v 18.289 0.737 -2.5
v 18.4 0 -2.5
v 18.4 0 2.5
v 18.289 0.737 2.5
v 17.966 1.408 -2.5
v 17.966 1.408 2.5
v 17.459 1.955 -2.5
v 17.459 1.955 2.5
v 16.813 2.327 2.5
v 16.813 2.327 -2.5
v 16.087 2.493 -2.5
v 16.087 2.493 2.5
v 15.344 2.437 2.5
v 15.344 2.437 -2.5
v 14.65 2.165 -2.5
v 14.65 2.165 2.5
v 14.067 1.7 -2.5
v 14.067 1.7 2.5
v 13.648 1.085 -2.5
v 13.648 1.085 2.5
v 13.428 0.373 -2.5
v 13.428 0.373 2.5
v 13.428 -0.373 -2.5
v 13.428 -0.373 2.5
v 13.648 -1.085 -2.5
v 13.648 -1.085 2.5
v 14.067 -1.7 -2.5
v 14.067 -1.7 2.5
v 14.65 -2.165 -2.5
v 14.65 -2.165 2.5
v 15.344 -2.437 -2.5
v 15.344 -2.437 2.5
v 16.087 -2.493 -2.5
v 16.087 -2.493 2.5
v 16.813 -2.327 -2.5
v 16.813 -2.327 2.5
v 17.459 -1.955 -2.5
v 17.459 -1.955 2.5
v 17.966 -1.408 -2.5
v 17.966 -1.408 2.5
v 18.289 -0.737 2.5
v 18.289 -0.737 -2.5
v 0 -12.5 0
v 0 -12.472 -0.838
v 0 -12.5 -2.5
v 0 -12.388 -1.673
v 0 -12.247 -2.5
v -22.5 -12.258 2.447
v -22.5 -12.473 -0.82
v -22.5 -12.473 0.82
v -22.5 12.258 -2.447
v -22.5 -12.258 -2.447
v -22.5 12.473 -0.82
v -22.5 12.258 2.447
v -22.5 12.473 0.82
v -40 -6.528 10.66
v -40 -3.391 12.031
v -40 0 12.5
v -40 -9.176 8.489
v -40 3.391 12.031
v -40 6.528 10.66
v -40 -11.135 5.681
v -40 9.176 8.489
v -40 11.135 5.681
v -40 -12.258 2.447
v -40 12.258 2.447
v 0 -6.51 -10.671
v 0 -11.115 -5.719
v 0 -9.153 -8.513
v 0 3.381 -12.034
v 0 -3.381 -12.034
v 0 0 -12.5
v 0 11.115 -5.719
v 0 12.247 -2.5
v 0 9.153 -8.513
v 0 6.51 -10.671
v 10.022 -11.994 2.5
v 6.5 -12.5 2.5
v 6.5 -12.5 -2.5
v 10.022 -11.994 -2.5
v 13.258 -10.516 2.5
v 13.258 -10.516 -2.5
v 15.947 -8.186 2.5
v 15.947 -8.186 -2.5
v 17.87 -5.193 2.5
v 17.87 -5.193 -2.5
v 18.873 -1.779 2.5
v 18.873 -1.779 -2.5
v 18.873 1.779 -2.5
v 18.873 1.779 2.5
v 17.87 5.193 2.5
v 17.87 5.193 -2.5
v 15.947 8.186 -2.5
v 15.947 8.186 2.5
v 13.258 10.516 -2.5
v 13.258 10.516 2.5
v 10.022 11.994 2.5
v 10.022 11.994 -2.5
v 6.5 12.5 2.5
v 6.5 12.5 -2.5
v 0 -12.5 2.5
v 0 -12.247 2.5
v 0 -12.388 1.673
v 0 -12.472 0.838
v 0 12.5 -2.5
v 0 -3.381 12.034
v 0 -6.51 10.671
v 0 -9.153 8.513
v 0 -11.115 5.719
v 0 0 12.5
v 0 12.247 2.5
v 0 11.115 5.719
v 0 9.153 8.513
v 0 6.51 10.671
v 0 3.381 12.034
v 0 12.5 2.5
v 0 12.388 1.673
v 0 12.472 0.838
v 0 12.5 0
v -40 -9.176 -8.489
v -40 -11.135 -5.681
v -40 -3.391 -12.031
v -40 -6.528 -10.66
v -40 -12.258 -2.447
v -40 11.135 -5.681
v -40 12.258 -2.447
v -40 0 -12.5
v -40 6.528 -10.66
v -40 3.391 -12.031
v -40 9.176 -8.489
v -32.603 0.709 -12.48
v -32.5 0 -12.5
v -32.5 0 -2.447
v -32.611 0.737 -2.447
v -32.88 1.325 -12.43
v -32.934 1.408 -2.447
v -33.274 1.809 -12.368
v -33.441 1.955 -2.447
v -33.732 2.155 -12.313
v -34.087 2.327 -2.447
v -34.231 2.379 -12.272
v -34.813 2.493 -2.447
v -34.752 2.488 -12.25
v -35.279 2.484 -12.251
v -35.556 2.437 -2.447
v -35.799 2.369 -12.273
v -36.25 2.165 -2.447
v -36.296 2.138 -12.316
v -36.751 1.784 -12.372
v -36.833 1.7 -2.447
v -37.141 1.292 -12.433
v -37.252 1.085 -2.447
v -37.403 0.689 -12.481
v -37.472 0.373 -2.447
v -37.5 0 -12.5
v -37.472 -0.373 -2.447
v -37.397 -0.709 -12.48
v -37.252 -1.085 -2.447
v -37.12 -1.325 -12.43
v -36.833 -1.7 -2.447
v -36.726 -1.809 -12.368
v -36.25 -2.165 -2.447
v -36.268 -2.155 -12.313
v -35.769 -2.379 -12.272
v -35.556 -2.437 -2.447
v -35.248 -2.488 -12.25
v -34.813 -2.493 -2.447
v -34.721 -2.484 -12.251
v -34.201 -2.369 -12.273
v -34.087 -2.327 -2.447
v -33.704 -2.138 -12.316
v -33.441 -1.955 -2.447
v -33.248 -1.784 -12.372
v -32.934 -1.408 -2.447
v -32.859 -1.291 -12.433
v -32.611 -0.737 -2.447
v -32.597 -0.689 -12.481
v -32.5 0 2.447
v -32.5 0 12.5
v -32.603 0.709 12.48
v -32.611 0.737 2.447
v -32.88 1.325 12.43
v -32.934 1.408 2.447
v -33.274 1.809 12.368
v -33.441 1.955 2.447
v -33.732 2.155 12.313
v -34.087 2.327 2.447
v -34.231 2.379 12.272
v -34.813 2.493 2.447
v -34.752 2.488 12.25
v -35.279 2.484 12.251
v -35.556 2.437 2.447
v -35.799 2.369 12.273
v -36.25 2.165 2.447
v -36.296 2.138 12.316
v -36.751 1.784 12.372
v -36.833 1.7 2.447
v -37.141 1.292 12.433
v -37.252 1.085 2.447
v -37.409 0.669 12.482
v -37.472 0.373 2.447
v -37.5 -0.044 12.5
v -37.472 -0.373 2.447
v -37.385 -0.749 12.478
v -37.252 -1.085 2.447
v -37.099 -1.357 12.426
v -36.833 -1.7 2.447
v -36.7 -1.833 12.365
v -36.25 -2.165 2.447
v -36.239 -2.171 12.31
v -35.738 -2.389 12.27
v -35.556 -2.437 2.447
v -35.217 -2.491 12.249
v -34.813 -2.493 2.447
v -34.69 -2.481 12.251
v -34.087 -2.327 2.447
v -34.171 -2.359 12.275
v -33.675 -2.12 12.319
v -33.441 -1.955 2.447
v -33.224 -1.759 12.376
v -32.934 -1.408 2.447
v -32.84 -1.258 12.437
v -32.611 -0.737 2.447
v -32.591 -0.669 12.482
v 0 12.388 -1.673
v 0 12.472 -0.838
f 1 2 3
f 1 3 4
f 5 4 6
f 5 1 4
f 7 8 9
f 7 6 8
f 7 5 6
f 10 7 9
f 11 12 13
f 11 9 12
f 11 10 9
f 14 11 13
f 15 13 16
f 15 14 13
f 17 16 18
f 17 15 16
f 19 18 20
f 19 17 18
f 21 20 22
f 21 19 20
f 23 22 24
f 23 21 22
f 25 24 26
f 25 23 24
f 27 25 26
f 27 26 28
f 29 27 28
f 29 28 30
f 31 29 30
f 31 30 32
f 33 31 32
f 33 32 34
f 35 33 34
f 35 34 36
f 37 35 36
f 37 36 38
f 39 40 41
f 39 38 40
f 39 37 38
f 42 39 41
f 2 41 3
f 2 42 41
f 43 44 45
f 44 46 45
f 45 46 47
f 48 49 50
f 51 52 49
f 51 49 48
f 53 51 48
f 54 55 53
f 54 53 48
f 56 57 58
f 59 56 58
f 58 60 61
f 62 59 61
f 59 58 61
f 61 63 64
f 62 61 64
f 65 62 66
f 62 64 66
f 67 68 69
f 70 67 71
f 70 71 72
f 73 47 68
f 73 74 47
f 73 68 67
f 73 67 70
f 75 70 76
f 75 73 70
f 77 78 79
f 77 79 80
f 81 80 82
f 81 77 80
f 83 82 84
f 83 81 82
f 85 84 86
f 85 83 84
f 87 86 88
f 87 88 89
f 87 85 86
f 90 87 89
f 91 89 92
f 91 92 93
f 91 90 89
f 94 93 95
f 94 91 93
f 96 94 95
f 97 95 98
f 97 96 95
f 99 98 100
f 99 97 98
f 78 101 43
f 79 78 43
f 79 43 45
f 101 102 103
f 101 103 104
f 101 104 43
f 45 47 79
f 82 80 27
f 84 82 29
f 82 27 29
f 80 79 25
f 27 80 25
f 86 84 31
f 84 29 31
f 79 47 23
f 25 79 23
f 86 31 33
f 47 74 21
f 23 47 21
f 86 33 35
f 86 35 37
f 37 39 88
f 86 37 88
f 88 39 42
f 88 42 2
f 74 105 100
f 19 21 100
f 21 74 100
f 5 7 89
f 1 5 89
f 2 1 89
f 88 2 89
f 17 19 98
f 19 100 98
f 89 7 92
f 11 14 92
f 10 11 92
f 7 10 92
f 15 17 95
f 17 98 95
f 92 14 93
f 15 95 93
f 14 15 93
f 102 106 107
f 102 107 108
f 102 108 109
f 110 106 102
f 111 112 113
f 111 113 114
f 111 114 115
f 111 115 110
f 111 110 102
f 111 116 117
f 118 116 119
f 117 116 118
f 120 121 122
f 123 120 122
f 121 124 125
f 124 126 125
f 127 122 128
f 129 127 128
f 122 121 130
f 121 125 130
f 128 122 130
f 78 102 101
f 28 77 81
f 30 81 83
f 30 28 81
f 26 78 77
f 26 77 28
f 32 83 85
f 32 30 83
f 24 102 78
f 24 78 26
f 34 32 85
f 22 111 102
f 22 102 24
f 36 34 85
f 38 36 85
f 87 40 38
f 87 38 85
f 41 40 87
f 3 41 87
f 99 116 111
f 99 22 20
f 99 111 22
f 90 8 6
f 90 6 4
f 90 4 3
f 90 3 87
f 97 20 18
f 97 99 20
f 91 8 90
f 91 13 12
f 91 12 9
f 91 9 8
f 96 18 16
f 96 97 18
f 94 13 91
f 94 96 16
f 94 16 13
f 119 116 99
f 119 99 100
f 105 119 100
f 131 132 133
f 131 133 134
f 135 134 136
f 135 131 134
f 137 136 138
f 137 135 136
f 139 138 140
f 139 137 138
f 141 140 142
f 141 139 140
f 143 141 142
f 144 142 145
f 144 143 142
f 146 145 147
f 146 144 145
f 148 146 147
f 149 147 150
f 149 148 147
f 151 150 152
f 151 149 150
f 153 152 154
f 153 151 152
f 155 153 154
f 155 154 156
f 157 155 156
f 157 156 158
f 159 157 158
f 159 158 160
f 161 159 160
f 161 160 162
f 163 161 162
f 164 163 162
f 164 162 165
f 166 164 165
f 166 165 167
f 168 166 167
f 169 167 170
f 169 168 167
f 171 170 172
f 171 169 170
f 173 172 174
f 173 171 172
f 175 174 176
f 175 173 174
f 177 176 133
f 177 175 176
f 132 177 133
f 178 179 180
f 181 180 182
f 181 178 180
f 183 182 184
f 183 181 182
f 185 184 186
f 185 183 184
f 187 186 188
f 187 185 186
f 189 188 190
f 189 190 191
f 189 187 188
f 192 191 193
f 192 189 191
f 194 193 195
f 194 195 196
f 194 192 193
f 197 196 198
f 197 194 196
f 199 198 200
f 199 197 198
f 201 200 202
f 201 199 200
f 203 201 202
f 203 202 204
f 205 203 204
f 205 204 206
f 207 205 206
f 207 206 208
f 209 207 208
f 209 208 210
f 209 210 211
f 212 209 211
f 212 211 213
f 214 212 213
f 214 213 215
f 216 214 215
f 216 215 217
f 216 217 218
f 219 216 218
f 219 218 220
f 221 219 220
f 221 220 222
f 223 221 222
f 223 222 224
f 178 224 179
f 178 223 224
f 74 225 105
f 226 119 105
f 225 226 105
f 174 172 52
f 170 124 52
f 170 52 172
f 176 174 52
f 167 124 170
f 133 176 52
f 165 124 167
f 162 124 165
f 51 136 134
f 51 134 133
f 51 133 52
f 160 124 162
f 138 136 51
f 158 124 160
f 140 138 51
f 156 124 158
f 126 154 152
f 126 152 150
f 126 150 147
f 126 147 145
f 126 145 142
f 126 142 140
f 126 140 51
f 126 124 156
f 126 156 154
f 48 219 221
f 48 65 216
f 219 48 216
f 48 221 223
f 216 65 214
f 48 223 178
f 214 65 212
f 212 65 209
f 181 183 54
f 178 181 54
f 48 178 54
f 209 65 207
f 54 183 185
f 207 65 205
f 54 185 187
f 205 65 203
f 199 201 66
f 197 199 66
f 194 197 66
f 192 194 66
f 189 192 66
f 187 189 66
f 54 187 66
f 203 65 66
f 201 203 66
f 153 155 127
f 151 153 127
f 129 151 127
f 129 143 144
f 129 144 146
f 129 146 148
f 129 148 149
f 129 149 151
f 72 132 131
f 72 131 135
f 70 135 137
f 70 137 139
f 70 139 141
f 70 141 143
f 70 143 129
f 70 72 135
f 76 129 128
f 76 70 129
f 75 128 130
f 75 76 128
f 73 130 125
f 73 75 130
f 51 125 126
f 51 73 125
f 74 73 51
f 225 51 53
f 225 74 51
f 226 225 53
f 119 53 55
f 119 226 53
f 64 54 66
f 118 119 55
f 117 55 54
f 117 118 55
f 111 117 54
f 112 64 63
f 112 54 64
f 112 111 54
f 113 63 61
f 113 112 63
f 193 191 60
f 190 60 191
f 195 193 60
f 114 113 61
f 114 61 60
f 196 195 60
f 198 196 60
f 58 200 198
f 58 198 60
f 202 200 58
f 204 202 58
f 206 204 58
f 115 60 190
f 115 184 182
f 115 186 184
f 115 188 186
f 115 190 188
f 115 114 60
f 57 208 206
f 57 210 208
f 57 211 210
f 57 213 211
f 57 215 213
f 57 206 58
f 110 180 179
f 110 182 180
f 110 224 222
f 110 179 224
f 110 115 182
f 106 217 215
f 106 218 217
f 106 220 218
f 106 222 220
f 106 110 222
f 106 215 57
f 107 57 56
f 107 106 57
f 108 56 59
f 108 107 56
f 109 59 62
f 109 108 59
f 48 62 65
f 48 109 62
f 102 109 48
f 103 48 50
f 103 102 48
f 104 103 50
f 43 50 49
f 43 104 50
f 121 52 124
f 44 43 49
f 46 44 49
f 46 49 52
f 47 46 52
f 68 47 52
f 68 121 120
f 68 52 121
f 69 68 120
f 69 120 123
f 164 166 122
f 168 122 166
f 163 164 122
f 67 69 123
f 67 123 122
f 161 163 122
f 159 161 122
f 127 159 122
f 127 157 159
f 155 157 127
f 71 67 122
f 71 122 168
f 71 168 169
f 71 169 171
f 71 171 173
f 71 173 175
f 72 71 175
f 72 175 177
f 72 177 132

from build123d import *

# Parameters (mm, degrees)
SKETCH1_R               = 12.5
BOSS_EXTRUDE1_DEPTH     = 40
SKETCH6_W               = 5
SKETCH6_H               = 25
BOSS_EXTRUDE3_DEPTH     = 6.5
BOSS_EXTRUDE4_DEPTH     = 5
CUT_EXTRUDE1_DEPTH      = 45.511234537
CUT_EXTRUDE1_DEPTH_BACK = 45.511234537
SKETCH10_R              = 2.5
SKETCH12_W              = 4.8936145
SKETCH12_H              = 25
CUT_EXTRUDE2_DEPTH      = 17.5
CUT_EXTRUDE3_DEPTH      = 44.732139211
CUT_EXTRUDE3_DEPTH_BACK = 44.732139211
SKETCH13_R              = 2.5


with BuildPart() as part:
    # Sketch1 → Boss-Extrude1 (new body)
    with BuildSketch(Plane(origin=(0, 0, 0), x_dir=(0, 0, -1), z_dir=(1, 0, 0))):
        Circle(SKETCH1_R)
    extrude(amount=-BOSS_EXTRUDE1_DEPTH)

    # Sketch6 → Boss-Extrude3 (add)
    with BuildSketch(Plane(origin=(0, 0, 0), x_dir=(0, 0, -1), z_dir=(1, 0, 0))):
        Rectangle(SKETCH6_W, SKETCH6_H)
    extrude(amount=BOSS_EXTRUDE3_DEPTH)

    # Sketch8 → Boss-Extrude4 (add)
    with BuildSketch(Plane.XY.offset(2.5)):
        with BuildLine():
            Line((6.5, 12.5), (6.5, -12.5))
            ThreePointArc((6.5, -12.5), (19, 0), (6.5, 12.5))
        make_face()
    extrude(amount=-BOSS_EXTRUDE4_DEPTH)

    # Sketch10 → Cut-Extrude1 (cut, two sides: drawn at the far end of the back side and taken through both)
    with BuildSketch(Plane.XY.offset(2.5).offset(-CUT_EXTRUDE1_DEPTH_BACK)):
        with Locations((15.9, 0)):
            Circle(SKETCH10_R)
    extrude(amount=CUT_EXTRUDE1_DEPTH + CUT_EXTRUDE1_DEPTH_BACK, mode=Mode.SUBTRACT)

    # Sketch12 → Cut-Extrude2 (cut)
    with BuildSketch(Plane.ZY.offset(40)):
        Rectangle(SKETCH12_W, SKETCH12_H)
    extrude(amount=-CUT_EXTRUDE2_DEPTH, mode=Mode.SUBTRACT)

    # Sketch13 → Cut-Extrude3 (cut, two sides: drawn at the far end of the back side and taken through both)
    with BuildSketch(Plane.XY.offset(-CUT_EXTRUDE3_DEPTH_BACK)):
        with Locations((-35, 0)):
            Circle(SKETCH13_R)
    extrude(amount=CUT_EXTRUDE3_DEPTH + CUT_EXTRUDE3_DEPTH_BACK, mode=Mode.SUBTRACT)


solid = part.part
